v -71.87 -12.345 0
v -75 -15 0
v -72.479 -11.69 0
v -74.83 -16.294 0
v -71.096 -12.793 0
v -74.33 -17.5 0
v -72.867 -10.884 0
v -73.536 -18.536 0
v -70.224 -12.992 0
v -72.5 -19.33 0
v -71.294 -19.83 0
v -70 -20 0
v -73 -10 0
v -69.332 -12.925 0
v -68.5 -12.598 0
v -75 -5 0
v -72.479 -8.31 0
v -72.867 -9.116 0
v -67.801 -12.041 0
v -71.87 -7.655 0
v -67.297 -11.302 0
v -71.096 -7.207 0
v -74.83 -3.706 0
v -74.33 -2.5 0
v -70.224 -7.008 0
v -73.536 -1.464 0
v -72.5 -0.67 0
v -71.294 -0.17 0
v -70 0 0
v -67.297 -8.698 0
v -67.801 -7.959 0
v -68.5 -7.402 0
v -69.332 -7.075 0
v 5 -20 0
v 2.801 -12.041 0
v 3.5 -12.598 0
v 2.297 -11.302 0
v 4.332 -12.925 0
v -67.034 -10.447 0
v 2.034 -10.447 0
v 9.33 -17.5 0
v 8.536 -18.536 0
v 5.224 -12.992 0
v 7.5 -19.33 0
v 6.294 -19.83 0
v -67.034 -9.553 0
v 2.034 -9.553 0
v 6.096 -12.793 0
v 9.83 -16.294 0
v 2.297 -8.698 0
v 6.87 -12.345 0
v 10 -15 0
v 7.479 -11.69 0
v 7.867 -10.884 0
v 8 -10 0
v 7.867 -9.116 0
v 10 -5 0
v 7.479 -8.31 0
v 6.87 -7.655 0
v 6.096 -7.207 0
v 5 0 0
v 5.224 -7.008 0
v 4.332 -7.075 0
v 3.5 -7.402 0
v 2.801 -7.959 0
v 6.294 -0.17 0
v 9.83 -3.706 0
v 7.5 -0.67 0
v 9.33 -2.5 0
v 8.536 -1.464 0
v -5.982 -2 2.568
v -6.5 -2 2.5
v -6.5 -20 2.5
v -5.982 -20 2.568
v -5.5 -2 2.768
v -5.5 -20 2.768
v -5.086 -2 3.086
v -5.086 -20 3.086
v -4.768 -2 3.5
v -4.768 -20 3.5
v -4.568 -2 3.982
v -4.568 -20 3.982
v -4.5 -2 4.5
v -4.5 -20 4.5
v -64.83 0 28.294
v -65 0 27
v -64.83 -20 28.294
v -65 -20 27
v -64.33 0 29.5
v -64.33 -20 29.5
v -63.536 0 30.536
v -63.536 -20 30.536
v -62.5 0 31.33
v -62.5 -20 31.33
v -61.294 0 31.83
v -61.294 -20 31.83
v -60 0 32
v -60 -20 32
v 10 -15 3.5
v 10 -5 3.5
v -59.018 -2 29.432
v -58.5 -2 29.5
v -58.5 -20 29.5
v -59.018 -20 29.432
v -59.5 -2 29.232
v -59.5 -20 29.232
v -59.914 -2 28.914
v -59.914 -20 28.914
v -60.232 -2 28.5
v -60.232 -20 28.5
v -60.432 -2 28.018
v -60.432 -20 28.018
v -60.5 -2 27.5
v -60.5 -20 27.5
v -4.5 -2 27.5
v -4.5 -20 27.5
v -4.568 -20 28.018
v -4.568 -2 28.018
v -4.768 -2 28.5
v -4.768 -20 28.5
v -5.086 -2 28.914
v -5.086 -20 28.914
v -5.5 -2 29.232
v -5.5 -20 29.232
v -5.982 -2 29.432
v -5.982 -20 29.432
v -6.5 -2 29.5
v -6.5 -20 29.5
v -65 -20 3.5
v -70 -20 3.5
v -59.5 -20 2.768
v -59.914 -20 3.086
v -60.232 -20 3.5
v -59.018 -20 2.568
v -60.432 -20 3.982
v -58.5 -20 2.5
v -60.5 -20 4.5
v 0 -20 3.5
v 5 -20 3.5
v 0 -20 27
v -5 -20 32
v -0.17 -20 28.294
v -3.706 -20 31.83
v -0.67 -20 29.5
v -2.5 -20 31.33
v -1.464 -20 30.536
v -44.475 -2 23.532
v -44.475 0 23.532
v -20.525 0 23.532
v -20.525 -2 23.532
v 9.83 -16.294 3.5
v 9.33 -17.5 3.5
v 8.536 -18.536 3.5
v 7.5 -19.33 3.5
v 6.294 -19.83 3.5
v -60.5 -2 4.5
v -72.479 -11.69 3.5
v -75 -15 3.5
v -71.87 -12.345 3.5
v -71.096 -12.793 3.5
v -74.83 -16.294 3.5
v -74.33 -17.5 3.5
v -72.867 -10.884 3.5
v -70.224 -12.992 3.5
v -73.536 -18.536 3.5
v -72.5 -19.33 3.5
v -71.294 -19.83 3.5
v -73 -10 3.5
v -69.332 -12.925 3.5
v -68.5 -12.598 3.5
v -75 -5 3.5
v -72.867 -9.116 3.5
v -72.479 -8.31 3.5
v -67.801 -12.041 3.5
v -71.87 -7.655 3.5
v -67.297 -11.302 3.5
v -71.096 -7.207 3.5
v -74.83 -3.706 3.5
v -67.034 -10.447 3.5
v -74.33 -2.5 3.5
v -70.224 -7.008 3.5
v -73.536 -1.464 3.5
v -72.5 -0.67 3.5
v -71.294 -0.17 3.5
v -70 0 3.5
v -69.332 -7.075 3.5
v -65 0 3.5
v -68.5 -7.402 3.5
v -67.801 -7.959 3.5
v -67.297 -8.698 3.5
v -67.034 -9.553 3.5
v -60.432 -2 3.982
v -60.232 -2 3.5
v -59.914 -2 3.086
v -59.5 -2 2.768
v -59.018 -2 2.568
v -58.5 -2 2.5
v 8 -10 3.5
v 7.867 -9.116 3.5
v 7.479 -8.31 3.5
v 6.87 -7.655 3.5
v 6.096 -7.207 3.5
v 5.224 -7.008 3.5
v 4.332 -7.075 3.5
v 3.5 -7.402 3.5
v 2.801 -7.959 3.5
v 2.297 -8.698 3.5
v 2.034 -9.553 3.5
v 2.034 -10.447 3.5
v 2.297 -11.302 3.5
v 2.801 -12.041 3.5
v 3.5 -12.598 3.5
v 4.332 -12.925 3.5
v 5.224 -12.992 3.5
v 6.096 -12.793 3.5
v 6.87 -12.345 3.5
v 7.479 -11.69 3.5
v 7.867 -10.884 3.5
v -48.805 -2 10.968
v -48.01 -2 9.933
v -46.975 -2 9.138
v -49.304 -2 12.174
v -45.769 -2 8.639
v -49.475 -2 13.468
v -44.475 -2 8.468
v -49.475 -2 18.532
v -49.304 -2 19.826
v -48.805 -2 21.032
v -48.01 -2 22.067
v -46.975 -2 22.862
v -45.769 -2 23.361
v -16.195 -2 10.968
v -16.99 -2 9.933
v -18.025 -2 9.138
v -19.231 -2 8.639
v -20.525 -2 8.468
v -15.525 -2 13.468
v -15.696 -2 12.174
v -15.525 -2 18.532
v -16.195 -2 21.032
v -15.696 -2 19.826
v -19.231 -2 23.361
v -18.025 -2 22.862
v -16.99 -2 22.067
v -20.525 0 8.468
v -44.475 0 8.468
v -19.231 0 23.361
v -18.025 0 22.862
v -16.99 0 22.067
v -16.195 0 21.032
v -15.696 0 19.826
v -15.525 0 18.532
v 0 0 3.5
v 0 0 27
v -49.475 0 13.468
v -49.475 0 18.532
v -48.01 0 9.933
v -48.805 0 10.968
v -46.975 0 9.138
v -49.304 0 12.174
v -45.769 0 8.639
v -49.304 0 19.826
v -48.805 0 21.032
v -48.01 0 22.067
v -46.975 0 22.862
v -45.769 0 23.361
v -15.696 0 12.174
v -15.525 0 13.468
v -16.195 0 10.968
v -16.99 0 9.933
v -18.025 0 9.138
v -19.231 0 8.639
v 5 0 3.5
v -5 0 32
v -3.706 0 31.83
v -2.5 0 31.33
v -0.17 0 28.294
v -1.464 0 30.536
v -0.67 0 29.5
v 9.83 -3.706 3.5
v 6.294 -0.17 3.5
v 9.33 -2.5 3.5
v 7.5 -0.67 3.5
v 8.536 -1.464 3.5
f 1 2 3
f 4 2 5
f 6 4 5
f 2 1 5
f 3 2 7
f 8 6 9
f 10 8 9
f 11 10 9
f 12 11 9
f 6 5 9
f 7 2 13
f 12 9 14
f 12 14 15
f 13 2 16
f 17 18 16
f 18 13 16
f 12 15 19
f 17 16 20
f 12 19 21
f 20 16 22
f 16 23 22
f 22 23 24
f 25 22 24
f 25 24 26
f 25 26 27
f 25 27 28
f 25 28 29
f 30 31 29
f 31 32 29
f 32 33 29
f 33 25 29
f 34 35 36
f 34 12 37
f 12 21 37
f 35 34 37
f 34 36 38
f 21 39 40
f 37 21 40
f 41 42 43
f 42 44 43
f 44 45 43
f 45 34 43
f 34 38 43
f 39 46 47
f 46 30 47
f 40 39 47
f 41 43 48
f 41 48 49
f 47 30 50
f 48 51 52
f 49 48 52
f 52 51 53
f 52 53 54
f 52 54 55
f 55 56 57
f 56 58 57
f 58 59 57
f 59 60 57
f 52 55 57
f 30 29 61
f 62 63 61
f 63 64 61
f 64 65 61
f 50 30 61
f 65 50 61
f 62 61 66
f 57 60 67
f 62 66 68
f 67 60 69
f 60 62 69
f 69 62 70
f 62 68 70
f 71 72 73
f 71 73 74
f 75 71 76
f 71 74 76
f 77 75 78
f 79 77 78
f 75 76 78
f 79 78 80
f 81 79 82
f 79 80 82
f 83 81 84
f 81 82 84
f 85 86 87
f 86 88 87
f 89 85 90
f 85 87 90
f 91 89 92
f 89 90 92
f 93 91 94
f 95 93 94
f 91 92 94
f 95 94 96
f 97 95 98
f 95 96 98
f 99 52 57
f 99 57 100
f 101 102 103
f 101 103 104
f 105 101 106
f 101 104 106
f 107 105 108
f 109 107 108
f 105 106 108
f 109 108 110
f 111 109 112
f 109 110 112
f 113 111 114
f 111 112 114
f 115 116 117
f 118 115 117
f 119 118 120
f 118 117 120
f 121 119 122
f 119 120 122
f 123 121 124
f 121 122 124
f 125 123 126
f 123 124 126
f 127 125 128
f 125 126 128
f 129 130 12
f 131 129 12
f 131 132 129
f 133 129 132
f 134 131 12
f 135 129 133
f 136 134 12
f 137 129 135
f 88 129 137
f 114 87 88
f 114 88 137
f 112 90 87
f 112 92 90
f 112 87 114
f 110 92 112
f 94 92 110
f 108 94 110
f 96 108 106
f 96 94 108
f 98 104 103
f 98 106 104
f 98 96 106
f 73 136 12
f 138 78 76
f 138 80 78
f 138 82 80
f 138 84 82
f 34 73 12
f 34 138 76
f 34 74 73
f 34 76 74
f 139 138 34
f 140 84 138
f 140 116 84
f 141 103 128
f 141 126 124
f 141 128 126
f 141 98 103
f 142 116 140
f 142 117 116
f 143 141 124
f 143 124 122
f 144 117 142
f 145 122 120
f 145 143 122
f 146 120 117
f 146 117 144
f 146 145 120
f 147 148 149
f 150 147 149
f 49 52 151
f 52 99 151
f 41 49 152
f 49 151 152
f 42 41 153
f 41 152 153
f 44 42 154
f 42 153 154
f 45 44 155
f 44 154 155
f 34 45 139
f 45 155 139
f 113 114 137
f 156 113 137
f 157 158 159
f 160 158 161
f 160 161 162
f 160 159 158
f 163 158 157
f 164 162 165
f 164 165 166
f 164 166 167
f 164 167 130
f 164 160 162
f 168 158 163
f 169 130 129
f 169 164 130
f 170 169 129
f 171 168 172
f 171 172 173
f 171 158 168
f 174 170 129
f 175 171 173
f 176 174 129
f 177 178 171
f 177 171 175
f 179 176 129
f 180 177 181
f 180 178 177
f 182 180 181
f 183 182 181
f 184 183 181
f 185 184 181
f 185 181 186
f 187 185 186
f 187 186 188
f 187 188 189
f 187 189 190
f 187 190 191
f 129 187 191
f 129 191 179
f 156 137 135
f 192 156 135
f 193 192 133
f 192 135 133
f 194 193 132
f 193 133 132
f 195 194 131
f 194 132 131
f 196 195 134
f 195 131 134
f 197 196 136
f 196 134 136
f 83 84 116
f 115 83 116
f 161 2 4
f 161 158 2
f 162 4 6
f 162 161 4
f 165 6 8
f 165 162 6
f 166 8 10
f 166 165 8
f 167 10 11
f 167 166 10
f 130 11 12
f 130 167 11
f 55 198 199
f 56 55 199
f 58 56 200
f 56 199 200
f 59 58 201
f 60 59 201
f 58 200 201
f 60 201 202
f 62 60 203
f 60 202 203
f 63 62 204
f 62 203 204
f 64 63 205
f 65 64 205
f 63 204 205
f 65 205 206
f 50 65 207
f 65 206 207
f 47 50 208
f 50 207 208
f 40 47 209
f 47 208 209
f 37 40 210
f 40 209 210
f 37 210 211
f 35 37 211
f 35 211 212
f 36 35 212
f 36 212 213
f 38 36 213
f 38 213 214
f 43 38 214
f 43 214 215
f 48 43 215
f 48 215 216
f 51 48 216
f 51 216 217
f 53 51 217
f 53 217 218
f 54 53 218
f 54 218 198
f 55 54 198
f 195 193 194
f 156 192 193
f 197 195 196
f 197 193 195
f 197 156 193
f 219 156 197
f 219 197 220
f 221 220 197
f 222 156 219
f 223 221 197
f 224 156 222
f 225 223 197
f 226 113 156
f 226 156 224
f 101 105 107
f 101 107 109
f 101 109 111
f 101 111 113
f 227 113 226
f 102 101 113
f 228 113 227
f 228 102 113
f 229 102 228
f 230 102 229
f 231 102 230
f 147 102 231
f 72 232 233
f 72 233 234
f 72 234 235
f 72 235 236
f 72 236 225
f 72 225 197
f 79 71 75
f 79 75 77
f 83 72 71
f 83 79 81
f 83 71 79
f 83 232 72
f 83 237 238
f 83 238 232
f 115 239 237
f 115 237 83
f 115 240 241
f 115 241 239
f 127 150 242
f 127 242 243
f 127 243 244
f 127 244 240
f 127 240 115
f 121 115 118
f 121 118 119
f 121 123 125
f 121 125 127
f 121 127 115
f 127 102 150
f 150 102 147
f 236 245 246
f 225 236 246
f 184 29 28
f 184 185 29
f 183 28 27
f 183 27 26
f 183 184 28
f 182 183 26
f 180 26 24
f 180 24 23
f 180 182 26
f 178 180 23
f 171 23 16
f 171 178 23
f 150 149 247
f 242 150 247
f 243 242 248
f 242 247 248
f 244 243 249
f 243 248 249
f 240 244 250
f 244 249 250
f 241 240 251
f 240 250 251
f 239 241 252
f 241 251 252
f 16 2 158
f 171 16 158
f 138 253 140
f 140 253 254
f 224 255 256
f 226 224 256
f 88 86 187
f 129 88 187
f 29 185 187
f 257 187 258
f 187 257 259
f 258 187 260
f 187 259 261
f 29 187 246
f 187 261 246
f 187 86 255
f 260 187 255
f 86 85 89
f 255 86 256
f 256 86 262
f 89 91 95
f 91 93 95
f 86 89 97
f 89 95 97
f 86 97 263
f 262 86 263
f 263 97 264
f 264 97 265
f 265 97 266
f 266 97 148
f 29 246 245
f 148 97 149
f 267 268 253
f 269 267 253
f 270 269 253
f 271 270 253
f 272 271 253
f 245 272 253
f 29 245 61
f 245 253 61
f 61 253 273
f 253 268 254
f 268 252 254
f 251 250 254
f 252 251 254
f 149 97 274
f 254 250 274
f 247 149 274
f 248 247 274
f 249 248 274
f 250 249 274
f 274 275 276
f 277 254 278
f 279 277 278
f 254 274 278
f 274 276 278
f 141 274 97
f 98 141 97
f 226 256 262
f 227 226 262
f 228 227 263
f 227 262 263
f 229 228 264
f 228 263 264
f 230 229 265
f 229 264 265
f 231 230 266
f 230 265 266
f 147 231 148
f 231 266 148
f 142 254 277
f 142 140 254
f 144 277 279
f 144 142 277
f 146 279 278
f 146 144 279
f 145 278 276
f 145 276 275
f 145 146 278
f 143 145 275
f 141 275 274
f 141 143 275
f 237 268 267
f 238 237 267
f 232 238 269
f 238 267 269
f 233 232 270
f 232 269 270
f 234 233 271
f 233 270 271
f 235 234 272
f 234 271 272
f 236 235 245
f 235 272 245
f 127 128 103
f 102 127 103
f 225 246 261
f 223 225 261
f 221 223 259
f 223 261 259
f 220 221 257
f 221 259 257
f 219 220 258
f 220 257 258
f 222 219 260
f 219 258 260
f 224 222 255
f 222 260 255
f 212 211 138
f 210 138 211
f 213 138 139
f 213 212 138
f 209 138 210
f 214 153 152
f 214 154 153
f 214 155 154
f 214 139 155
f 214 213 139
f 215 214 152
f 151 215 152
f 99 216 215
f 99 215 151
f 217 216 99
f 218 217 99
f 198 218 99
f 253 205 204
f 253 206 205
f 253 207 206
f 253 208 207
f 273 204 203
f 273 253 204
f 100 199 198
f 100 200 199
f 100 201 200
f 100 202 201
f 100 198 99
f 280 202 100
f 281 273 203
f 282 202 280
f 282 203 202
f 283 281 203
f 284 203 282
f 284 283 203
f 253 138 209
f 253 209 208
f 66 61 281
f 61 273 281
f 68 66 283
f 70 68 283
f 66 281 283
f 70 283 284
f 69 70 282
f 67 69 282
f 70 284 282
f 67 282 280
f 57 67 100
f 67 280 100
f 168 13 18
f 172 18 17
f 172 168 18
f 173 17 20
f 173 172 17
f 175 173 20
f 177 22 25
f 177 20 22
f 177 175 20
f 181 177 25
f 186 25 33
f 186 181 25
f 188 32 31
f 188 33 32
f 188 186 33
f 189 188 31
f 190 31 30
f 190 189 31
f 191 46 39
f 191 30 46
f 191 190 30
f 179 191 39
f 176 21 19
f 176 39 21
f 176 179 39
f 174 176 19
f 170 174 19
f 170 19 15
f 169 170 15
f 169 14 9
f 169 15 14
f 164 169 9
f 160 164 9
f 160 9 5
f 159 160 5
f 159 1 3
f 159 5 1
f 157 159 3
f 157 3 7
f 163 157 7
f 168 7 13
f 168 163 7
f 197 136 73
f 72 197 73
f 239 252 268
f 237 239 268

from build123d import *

# Parameters (mm, degrees)
F0_W      = 10
F0_H      = 3.5
F1_DEPTH  = 20
F2_R      = 3
F3_DEPTH  = 3.501
F6_R      = 5
F9_DEPTH  = 18
F10_DEPTH = 20.001
F11_R     = 5


with BuildPart() as f1:
    # F0 (on Front) → F1 (new body)
    with BuildSketch(Plane.XZ):
        with Locations((-70, 1.75)):
            Rectangle(F0_W, F0_H)
        Polygon((-65, 0), (0, 0), (0, 3.5), (0, 32), (-65, 32), (-65, 3.5), align=None)
        with Locations((5, 1.75)):
            Rectangle(F0_W, F0_H)
    extrude(amount=F1_DEPTH)

    # F2 (on face) → F3 (cut, through all)
    with BuildSketch(Plane.XY.offset(3.5)):
        with Locations((5, -10)):
            Circle(F2_R)
    f3 = extrude(amount=-F3_DEPTH, mode=Mode.SUBTRACT)

    # F5: F3 across plane
    add(f3.mirror(Plane.YZ.offset(-32.5)), mode=Mode.SUBTRACT)

    # F6
    f6_edges = [f1.edges().sort_by_distance(p)[0] for p in [
        (0, -10, 32),
        (-65, -10, 32),
    ]]
    fillet(f6_edges, radius=F6_R)

    # F8 (on face) → F9 (cut)
    with BuildSketch(Plane.XZ.offset(20)):
        with BuildLine():
            Line((-58.5, 2.5), (-6.5, 2.5))
            ThreePointArc((-6.5, 2.5), (-5.0857864376, 3.0857864376), (-4.5, 4.5))
            Line((-4.5, 4.5), (-4.5, 27.5))
            ThreePointArc((-4.5, 27.5), (-5.0857864376, 28.9142135624), (-6.5, 29.5))
            Line((-6.5, 29.5), (-58.5, 29.5))
            ThreePointArc((-58.5, 29.5), (-59.9142135624, 28.9142135624), (-60.5, 27.5))
            Line((-60.5, 27.5), (-60.5, 4.5))
            ThreePointArc((-60.5, 4.5), (-59.9142135624, 3.0857864376), (-58.5, 2.5))
        make_face()
    extrude(amount=-F9_DEPTH, mode=Mode.SUBTRACT)

    # F7 (on face) → F10 (cut, through all)
    with BuildSketch(Plane(origin=(0, 0, 0), x_dir=(-1, 0, 0), z_dir=(0, 1, 0))):
        with BuildLine():
            ThreePointArc((15.5251769957, 13.4682242014), (16.9896430898, 9.9326902954), (20.5251769957, 8.4682242014))
            Line((20.5251769957, 8.4682242014), (44.4748230043, 8.4682242014))
            ThreePointArc((44.4748230043, 8.4682242014), (48.0103569102, 9.9326902954), (49.4748230043, 13.4682242014))
            Line((49.4748230043, 13.4682242014), (49.4748230043, 18.5317757986))
            ThreePointArc((49.4748230043, 18.5317757986), (48.0103569102, 22.0673097046), (44.4748230043, 23.5317757986))
            Line((44.4748230043, 23.5317757986), (20.5251769957, 23.5317757986))
            ThreePointArc((20.5251769957, 23.5317757986), (16.9896430898, 22.0673097046), (15.5251769957, 18.5317757986))
            Line((15.5251769957, 18.5317757986), (15.5251769957, 13.4682242014))
        make_face()
    extrude(amount=-F10_DEPTH, mode=Mode.SUBTRACT)

    # F11
    f11_edges = [f1.edges().sort_by_distance(p)[0] for p in [
        (-75, -20, 1.75),
        (-75, 0, 1.75),
        (10, -20, 1.75),
        (10, 0, 1.75),
    ]]
    fillet(f11_edges, radius=F11_R)


solid = f1.part
